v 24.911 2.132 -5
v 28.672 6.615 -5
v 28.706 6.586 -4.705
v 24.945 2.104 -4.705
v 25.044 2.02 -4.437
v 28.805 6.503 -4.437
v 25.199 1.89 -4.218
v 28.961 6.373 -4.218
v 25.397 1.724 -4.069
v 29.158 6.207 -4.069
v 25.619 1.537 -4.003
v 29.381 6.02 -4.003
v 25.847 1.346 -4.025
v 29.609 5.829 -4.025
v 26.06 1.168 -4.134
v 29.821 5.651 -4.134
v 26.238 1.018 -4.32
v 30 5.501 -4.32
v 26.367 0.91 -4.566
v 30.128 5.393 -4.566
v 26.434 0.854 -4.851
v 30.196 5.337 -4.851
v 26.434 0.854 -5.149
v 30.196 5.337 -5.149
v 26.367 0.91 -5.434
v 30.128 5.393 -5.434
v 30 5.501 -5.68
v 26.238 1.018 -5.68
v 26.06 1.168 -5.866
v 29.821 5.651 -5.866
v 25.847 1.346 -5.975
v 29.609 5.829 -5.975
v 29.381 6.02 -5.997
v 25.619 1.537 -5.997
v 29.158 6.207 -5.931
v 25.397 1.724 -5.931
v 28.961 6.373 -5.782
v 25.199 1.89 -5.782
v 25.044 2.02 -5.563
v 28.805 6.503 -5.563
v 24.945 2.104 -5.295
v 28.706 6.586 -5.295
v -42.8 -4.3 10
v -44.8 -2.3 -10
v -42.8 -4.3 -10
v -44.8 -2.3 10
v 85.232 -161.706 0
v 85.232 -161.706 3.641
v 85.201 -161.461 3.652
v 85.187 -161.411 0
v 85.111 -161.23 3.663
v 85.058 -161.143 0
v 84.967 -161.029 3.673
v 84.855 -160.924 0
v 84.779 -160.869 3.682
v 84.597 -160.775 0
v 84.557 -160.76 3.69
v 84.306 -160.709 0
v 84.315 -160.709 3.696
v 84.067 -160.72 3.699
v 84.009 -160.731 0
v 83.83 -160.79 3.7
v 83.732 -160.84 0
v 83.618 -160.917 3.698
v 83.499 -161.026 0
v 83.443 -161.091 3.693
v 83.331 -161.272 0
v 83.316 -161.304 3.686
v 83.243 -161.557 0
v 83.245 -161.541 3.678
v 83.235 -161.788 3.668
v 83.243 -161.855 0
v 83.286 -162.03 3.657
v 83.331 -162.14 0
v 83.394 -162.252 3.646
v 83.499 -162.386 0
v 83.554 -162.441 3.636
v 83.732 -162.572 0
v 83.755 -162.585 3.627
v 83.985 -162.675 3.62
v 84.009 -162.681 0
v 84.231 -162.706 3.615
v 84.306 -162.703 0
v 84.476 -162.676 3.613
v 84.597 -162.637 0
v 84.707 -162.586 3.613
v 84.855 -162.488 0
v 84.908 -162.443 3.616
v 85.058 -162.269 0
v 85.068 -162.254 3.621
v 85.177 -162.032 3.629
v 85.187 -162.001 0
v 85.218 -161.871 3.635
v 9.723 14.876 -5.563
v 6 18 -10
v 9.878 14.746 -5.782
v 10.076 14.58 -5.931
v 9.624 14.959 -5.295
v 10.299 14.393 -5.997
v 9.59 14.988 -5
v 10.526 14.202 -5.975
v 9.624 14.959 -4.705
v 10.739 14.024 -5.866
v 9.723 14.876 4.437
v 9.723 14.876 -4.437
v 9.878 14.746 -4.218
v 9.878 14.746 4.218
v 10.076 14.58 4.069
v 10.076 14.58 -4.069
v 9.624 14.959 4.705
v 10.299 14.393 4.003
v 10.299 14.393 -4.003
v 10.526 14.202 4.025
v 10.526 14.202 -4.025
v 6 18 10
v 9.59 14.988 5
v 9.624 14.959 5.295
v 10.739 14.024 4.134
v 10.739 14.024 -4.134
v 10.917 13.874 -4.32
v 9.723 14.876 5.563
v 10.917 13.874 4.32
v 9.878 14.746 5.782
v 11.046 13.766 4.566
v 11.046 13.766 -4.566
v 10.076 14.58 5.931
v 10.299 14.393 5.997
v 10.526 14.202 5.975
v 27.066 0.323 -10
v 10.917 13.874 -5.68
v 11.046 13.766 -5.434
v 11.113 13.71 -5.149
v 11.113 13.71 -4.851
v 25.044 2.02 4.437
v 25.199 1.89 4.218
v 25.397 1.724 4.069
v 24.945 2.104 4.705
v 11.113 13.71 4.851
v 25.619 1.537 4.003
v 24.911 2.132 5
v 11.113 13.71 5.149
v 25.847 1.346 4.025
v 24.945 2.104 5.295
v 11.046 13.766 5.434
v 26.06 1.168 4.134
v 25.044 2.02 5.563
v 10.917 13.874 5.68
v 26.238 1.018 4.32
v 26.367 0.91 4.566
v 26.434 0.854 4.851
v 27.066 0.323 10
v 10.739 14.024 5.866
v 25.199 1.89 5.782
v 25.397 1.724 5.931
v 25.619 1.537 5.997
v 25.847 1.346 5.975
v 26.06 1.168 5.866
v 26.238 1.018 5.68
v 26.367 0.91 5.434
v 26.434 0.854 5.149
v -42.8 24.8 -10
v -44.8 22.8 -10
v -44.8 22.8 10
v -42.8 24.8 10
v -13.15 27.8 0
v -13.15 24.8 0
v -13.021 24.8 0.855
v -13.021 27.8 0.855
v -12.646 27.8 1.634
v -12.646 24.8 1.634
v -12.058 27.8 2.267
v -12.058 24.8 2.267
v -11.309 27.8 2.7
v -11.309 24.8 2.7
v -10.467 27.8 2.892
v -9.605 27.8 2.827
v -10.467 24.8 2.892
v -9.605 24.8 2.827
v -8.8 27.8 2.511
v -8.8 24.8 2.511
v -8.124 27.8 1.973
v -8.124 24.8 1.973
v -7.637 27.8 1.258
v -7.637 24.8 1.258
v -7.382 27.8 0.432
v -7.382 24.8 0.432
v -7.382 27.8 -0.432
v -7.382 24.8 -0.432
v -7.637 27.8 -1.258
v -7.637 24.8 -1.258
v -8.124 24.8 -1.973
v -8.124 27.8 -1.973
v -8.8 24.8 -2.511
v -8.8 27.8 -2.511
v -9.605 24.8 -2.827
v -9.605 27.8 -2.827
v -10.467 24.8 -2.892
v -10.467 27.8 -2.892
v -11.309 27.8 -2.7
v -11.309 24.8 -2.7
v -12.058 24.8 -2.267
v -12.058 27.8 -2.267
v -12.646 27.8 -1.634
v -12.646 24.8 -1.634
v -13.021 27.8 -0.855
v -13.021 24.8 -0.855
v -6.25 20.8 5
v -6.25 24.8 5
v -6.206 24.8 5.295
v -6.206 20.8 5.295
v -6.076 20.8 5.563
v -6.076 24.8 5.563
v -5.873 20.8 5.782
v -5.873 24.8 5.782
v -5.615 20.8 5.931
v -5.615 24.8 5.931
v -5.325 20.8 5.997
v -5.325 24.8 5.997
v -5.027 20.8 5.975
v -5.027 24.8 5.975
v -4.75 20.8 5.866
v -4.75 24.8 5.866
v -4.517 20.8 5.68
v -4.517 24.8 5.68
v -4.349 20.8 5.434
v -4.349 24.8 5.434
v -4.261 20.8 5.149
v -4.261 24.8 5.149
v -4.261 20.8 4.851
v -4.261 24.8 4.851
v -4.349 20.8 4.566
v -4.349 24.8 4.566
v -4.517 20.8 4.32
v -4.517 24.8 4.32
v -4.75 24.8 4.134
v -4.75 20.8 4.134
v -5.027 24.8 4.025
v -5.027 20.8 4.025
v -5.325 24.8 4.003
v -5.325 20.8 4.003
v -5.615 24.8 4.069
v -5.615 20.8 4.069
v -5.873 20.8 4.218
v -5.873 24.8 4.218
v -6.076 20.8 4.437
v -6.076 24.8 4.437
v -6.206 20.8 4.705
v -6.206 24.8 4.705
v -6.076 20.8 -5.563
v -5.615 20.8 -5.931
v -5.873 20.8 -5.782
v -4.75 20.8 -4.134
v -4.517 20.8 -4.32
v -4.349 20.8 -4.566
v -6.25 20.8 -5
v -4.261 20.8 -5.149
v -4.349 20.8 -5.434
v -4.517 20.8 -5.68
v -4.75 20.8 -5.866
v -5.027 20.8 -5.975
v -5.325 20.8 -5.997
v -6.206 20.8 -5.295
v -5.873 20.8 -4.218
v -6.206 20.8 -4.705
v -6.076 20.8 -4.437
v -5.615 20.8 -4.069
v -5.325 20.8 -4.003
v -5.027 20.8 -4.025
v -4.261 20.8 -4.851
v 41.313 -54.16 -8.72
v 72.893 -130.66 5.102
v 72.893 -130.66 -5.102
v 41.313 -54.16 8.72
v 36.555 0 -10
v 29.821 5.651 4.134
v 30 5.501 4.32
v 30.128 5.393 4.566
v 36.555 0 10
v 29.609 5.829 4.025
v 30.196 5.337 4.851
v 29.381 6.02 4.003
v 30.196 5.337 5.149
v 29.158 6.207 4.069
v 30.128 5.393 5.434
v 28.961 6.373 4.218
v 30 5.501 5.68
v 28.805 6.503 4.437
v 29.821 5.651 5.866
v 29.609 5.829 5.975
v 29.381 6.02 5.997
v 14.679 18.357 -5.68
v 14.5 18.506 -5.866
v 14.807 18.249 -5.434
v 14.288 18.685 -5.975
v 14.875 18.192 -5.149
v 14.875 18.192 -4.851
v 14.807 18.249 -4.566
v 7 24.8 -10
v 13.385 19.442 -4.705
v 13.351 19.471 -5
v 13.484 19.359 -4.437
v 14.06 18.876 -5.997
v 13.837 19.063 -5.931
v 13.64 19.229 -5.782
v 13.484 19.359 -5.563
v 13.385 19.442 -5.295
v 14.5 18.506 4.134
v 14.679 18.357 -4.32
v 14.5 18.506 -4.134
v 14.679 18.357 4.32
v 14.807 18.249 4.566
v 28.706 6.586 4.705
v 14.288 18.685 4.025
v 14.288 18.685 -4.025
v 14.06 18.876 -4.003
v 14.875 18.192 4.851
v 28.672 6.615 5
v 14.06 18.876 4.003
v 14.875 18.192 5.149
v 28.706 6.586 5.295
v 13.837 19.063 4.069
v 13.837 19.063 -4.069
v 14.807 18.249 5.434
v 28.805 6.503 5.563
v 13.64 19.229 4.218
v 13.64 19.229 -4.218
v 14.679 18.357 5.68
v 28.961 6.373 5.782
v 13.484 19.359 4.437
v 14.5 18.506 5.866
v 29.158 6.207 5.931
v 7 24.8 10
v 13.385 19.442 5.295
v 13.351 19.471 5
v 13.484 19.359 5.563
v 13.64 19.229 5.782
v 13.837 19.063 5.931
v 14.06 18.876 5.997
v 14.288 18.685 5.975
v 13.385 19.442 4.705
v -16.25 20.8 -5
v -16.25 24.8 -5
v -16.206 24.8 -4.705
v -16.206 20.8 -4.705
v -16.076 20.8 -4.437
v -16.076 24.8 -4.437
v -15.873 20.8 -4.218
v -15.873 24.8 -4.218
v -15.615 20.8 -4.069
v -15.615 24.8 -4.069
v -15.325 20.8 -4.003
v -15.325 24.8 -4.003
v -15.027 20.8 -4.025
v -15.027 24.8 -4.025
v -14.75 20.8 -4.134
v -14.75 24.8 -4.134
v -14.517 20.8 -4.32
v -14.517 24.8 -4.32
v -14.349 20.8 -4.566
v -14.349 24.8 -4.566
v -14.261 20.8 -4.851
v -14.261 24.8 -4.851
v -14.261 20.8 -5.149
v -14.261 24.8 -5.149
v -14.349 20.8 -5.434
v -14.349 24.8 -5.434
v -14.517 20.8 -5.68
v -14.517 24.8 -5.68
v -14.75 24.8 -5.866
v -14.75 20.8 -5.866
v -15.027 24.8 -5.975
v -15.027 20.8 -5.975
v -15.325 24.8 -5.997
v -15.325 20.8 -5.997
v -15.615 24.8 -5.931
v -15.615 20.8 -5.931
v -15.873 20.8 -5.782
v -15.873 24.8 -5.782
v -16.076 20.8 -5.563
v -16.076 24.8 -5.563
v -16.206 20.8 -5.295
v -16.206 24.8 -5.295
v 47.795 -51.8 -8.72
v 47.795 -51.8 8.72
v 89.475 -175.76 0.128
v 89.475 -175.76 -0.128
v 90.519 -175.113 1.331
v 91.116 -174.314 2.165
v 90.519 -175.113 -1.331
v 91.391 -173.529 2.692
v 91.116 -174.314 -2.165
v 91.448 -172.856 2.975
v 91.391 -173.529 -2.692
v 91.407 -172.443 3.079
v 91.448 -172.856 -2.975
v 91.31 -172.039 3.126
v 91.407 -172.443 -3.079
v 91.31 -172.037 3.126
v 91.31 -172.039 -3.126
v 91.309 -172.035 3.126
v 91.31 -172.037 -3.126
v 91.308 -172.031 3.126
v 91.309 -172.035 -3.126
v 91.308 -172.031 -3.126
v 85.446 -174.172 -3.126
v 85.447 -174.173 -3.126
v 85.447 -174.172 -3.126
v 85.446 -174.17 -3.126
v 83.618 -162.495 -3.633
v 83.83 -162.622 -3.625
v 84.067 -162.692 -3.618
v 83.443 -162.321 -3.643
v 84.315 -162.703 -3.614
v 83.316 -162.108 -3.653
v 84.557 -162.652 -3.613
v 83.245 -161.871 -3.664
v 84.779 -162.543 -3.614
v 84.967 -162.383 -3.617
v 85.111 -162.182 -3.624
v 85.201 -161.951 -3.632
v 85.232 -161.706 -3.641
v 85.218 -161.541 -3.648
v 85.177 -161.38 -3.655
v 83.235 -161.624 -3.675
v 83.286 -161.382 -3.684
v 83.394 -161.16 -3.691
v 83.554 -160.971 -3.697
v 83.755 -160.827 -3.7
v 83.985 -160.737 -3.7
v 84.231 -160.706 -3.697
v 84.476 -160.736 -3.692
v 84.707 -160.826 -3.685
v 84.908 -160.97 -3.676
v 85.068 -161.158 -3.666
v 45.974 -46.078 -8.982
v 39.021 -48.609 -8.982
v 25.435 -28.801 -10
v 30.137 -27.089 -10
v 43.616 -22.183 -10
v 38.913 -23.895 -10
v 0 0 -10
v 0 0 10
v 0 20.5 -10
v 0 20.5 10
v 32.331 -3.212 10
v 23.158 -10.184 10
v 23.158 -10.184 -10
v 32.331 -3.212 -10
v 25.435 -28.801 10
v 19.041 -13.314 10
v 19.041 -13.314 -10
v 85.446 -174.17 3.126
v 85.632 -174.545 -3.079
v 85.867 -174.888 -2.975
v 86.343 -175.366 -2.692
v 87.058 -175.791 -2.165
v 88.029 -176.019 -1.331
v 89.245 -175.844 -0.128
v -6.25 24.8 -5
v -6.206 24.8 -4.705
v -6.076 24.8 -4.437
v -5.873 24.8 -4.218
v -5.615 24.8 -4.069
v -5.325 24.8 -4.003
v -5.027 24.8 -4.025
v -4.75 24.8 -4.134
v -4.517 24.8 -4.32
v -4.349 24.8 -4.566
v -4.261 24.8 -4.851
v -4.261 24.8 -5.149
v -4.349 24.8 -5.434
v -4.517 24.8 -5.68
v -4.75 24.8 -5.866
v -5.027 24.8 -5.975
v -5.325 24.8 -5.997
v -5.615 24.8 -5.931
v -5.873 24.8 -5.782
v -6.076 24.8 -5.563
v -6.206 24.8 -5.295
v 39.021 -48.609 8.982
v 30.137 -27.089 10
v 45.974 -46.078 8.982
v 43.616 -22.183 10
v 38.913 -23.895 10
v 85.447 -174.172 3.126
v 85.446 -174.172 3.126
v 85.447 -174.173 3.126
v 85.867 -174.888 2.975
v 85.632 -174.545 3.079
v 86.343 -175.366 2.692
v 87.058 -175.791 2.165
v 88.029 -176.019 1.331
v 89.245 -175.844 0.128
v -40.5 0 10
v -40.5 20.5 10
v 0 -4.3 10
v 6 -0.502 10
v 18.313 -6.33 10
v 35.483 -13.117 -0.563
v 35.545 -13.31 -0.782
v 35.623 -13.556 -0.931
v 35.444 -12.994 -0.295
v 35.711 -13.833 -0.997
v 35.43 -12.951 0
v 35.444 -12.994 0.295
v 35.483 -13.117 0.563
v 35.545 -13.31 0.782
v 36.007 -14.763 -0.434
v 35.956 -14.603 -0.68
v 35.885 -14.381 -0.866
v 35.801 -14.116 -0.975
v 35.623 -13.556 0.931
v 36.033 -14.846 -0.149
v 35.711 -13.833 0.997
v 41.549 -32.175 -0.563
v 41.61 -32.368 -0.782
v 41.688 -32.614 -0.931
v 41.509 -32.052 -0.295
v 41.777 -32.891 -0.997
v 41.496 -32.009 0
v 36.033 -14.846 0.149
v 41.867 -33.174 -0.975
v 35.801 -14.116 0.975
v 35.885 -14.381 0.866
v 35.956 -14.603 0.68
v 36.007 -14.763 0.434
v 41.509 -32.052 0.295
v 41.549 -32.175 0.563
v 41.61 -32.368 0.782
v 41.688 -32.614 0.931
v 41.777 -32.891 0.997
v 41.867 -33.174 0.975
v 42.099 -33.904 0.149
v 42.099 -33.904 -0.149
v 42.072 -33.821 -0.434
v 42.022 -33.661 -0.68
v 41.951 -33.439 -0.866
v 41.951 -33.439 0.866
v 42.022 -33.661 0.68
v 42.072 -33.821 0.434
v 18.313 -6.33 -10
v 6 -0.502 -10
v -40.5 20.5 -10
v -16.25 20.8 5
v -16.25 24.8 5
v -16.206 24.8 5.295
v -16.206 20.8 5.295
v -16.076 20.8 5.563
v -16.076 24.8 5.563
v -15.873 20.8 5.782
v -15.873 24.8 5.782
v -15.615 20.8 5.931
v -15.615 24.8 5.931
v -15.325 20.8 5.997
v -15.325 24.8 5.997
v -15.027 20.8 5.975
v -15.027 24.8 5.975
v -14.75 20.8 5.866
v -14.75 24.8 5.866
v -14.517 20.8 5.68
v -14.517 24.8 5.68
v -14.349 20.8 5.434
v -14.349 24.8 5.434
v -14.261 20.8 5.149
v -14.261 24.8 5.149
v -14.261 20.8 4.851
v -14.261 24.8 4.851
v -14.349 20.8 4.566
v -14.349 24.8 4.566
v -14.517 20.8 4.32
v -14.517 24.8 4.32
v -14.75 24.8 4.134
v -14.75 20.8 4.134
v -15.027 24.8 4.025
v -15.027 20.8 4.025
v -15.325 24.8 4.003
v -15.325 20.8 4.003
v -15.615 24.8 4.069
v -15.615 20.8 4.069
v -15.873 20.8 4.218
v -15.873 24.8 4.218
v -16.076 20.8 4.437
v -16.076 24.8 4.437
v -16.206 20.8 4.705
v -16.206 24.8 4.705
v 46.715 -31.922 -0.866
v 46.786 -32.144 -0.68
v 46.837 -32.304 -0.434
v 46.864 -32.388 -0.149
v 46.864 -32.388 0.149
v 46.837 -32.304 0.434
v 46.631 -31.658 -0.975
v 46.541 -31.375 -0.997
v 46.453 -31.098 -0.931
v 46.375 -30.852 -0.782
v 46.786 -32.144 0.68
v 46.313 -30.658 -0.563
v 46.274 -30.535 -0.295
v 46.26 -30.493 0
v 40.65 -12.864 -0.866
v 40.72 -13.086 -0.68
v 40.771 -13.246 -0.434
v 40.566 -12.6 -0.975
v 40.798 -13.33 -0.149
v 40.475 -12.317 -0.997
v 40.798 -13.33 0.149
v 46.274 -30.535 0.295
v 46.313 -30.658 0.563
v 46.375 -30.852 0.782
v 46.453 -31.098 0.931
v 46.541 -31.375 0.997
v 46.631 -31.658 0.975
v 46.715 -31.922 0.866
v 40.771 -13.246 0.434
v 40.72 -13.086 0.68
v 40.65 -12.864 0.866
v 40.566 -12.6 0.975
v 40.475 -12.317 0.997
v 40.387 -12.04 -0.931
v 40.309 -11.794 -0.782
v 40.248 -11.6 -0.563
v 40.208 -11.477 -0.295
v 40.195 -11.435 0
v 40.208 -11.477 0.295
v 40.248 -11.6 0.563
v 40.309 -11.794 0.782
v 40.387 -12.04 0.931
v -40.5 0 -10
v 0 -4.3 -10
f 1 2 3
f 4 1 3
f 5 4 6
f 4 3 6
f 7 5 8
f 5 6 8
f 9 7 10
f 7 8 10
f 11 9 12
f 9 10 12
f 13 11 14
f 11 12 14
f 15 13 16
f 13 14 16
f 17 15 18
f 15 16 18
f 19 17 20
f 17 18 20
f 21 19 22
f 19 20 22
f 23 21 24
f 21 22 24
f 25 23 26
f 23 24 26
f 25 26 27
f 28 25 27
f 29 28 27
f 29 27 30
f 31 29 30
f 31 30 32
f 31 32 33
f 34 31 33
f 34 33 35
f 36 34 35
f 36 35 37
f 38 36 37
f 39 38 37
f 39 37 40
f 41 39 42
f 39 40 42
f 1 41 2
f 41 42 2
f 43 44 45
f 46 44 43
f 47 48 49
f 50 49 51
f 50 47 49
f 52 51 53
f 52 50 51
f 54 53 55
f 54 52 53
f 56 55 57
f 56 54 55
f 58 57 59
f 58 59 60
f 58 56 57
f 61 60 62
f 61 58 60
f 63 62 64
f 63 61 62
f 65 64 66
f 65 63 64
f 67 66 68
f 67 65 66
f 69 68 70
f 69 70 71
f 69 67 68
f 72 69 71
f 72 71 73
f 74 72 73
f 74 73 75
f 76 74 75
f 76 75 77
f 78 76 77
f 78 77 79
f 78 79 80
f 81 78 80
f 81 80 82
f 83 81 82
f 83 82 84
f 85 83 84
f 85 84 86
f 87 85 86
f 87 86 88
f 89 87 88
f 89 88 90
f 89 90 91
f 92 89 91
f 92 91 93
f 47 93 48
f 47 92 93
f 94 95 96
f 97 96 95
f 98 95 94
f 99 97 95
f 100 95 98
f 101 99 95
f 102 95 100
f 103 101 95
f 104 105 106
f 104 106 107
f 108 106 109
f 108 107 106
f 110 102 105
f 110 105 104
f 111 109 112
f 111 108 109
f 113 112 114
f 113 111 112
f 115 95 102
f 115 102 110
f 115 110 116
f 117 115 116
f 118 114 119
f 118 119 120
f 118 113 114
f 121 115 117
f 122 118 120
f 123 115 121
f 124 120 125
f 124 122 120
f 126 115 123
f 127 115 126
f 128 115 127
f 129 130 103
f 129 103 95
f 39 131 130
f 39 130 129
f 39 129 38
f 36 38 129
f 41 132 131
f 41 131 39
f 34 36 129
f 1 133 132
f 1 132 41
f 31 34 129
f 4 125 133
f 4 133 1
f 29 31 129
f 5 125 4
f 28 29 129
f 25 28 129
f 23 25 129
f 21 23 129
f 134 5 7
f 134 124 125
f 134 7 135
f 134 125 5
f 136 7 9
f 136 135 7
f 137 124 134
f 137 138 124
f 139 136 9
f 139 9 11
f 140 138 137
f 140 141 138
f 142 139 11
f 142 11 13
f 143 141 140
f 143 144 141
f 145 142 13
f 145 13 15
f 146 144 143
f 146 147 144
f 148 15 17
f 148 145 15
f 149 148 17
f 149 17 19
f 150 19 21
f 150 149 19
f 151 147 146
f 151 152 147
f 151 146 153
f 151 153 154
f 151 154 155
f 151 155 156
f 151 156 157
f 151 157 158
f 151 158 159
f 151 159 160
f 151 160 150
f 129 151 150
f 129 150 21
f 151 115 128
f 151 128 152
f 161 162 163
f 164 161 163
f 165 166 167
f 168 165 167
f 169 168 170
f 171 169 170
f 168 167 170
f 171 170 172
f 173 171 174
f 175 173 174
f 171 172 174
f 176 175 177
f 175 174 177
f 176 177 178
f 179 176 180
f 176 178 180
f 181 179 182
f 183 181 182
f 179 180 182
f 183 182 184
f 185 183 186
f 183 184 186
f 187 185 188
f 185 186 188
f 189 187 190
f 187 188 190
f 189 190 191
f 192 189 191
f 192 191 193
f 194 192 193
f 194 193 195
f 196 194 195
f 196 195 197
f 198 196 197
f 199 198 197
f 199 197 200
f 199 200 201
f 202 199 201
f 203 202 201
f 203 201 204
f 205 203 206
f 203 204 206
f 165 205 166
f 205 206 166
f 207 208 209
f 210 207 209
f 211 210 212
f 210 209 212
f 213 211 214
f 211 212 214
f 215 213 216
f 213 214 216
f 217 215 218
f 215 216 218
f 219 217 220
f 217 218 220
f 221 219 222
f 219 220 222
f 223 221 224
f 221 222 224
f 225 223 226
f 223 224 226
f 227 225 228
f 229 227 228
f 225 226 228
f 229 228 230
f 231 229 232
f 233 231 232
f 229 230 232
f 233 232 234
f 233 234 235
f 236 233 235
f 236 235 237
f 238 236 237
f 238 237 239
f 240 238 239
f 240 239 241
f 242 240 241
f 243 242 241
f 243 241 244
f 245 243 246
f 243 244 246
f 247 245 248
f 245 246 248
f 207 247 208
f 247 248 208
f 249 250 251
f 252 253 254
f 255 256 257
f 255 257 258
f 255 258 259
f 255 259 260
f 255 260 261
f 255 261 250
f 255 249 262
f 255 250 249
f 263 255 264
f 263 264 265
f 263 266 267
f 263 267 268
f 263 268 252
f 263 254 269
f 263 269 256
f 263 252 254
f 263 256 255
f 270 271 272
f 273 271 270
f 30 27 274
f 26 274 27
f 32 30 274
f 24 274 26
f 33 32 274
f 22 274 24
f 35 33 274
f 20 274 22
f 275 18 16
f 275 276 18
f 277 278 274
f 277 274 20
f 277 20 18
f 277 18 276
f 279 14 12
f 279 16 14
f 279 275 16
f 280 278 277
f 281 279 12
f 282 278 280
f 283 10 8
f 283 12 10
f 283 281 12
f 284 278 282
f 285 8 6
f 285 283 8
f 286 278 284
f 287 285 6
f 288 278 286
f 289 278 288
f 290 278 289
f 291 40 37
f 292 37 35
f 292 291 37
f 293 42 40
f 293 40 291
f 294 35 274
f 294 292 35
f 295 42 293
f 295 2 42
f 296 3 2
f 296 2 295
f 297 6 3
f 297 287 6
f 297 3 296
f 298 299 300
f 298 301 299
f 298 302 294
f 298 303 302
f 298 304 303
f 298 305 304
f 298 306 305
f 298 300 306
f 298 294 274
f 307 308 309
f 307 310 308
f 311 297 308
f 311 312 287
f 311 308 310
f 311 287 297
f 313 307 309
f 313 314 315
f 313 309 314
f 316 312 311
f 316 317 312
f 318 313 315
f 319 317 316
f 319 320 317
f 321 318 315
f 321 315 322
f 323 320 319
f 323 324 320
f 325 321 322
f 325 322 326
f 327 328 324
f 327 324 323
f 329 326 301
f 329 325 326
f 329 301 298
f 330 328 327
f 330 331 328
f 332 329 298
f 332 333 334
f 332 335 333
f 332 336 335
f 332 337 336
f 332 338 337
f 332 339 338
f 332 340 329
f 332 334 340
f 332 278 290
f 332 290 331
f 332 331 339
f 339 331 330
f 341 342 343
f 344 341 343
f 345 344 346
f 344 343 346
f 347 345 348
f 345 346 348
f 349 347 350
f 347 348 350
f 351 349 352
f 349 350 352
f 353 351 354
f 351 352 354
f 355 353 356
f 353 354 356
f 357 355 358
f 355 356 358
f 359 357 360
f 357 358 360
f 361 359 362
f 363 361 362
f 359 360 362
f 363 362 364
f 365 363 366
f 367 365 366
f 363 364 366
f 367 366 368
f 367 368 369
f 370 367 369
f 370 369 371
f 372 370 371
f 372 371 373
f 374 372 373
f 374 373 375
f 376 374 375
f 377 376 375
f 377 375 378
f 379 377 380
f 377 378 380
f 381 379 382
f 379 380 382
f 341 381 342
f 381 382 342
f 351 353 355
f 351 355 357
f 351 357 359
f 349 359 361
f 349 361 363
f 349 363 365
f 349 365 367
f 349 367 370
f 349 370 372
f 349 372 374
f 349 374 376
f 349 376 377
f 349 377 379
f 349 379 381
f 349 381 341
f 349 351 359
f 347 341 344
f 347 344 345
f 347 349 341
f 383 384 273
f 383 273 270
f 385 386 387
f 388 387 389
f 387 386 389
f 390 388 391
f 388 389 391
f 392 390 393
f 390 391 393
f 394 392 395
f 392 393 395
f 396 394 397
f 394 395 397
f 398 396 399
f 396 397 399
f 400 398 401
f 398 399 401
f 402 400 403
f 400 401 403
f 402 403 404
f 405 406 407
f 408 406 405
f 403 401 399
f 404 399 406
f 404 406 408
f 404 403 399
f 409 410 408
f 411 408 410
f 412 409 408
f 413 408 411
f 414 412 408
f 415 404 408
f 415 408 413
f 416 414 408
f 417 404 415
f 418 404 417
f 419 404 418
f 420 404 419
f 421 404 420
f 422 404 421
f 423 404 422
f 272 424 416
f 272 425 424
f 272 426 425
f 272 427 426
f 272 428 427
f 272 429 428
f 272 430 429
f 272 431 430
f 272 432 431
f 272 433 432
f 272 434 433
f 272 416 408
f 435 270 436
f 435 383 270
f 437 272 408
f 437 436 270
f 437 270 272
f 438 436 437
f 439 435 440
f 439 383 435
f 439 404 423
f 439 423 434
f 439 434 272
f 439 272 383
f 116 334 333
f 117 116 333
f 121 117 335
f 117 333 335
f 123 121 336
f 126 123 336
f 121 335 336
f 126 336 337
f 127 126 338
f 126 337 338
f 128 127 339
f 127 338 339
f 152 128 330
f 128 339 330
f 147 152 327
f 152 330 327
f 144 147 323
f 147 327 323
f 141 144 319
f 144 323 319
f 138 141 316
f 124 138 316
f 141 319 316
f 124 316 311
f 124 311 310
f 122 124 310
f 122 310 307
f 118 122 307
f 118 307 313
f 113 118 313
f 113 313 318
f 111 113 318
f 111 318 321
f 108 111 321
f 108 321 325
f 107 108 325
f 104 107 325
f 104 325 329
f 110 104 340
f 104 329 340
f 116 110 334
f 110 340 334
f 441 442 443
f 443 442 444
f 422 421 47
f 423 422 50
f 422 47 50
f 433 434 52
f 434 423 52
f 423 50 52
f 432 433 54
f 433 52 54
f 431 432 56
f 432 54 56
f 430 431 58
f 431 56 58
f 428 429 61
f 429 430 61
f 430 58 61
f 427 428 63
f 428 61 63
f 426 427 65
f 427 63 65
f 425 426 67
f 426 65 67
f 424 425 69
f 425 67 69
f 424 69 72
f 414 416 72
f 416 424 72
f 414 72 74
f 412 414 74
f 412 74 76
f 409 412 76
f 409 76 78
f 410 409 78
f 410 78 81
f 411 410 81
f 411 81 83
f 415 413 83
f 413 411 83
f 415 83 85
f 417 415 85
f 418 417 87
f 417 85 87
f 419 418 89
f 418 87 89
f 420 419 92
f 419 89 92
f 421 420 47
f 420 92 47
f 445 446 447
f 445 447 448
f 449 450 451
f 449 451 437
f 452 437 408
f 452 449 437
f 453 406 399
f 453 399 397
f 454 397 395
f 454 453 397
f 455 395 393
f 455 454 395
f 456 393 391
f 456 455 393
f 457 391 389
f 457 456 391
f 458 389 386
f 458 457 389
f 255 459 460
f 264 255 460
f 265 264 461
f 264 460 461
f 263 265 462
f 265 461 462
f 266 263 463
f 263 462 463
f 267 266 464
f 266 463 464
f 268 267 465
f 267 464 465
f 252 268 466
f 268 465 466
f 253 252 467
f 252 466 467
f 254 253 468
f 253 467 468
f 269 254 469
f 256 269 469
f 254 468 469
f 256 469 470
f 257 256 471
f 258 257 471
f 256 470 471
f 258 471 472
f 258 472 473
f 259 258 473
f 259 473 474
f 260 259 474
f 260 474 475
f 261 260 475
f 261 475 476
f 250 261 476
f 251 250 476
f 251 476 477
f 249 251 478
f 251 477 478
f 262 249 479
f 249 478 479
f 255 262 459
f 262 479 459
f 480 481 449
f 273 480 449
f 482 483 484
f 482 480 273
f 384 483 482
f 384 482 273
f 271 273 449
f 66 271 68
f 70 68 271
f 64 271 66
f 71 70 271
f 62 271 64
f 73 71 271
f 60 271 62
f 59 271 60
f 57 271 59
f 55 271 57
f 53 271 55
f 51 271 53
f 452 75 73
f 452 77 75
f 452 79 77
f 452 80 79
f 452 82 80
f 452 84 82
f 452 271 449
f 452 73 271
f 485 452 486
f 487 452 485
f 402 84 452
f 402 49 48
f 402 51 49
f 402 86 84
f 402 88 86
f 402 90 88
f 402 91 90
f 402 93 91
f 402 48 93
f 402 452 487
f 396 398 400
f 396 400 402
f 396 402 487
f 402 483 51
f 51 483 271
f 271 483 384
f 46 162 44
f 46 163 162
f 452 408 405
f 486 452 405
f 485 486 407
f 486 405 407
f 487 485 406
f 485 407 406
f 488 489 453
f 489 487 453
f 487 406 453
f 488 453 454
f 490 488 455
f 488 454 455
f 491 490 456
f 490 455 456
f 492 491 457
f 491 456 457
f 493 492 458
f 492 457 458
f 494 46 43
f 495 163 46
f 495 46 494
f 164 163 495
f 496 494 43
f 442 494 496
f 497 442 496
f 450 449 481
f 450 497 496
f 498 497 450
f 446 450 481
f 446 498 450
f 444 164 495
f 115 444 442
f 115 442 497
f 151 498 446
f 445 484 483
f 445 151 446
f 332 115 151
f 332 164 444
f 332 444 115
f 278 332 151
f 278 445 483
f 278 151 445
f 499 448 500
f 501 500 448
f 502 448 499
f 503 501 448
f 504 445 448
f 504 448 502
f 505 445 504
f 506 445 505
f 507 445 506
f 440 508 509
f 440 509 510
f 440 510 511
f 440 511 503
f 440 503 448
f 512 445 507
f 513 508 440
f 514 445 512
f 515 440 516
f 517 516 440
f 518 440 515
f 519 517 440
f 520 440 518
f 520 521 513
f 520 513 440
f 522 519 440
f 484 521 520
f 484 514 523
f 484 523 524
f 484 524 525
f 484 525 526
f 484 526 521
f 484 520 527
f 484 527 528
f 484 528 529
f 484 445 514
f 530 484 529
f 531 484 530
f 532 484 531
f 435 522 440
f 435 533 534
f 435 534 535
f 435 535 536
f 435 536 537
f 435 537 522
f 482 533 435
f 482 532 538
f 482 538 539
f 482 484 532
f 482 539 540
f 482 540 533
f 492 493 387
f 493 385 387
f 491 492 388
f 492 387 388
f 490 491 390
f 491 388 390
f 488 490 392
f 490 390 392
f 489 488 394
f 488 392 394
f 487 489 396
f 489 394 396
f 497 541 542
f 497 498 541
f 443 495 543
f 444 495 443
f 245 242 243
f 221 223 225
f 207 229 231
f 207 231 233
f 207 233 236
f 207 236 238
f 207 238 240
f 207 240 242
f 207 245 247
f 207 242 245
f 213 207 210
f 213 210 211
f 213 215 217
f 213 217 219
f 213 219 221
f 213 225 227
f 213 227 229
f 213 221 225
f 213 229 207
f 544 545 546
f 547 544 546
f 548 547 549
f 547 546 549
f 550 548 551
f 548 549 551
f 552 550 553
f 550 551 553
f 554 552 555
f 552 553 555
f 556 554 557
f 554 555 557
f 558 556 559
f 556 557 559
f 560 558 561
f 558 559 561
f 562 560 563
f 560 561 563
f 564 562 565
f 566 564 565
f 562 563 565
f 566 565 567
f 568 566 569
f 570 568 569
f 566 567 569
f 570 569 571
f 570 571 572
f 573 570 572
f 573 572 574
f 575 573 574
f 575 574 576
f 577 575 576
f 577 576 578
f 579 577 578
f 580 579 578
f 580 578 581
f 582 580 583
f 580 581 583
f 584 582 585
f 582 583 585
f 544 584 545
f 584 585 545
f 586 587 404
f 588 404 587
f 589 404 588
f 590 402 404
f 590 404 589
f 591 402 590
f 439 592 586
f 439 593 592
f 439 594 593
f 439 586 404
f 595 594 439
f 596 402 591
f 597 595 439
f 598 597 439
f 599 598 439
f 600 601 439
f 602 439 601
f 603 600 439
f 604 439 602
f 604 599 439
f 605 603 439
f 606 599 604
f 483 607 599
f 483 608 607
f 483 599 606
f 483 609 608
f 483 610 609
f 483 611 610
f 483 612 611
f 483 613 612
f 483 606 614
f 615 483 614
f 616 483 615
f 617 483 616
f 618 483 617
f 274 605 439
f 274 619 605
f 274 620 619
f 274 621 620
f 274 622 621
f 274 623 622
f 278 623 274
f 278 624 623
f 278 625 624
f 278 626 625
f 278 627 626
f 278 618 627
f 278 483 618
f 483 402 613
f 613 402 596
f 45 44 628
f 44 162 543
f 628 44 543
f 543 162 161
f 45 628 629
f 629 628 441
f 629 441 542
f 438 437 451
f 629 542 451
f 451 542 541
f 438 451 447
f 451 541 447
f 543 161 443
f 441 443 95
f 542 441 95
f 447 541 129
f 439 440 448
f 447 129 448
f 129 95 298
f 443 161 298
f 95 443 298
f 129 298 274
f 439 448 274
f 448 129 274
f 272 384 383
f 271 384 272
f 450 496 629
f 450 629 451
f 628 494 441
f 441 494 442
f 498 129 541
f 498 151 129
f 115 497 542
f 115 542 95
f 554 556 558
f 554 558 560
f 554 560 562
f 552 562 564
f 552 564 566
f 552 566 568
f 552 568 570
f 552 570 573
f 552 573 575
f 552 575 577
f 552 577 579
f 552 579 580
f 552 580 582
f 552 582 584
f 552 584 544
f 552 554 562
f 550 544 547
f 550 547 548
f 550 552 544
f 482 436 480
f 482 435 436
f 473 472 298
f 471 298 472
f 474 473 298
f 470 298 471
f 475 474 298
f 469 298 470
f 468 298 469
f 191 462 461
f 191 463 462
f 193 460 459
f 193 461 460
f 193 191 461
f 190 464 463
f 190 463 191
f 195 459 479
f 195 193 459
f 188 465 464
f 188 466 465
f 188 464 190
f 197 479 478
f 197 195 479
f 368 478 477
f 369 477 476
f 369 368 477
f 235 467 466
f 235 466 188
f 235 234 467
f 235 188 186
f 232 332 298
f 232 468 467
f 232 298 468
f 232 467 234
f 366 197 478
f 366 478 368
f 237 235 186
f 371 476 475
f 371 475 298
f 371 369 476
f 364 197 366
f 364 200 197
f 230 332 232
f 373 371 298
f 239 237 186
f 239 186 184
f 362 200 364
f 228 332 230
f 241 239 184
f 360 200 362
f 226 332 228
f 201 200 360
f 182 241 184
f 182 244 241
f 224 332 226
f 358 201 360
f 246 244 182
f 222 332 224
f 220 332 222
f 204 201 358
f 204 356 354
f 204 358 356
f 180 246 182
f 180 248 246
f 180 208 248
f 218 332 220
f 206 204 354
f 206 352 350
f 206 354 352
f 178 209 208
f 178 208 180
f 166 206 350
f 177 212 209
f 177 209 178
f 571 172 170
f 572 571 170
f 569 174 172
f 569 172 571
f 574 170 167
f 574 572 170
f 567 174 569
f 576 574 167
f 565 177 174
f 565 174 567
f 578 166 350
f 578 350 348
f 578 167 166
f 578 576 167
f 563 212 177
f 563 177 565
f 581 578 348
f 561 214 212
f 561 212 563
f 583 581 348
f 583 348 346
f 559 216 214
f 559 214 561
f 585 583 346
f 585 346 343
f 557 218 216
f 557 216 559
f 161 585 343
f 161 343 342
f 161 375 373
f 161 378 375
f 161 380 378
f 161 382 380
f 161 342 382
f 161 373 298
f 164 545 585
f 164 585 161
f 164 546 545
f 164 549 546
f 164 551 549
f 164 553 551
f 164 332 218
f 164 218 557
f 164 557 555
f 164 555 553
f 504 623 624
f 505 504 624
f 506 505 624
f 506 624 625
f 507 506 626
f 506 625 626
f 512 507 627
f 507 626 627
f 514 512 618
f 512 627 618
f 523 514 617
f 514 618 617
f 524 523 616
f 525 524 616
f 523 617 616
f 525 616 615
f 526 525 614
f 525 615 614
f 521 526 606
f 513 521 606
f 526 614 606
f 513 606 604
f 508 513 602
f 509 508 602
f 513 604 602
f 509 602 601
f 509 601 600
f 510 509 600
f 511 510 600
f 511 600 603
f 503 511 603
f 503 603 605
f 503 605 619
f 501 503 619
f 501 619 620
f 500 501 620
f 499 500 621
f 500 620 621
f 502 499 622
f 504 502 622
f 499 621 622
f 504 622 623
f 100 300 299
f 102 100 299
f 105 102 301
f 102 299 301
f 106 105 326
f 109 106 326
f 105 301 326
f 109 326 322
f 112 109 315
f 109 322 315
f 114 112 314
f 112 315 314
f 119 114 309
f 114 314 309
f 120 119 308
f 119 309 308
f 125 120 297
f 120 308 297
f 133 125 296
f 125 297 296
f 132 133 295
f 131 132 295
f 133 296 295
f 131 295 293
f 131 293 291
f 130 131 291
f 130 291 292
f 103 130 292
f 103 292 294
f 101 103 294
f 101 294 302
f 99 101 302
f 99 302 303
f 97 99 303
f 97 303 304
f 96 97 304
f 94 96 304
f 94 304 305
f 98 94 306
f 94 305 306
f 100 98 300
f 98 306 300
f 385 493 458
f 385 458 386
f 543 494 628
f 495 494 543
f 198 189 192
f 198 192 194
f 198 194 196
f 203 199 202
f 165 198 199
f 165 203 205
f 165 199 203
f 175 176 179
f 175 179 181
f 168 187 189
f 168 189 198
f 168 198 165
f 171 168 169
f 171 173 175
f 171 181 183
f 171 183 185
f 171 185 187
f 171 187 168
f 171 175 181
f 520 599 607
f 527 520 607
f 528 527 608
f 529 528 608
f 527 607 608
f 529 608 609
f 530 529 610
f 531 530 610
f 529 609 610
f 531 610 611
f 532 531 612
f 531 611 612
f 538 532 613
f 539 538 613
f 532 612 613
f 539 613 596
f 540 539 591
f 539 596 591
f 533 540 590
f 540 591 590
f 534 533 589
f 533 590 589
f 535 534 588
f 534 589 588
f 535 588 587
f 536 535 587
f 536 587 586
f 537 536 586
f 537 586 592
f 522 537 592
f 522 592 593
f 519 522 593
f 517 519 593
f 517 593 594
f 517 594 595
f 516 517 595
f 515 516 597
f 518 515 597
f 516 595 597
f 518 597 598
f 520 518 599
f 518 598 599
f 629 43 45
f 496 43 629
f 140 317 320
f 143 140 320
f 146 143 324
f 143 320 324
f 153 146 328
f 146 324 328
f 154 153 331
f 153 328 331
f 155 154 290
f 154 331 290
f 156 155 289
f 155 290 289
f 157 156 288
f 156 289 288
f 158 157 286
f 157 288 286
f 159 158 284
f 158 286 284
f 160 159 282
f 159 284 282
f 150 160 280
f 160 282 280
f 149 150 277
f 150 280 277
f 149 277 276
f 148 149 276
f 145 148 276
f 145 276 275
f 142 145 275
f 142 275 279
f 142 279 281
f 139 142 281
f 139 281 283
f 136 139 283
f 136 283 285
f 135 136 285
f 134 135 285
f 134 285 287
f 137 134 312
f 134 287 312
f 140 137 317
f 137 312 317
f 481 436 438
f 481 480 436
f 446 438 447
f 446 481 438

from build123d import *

# Parameters (mm, degrees)
F0_W           = 40.5
F0_H           = 20.5
F1_DEPTH       = 10
F2_SIZE        = 2
F3_R           = 2.9
F4_DEPTH       = 3
F7_DEPTH       = 126.422950013
F7_DEPTH_BACK  = 72.2858581577
F8_R           = 3
F9_R           = 1
F10_DEPTH      = 4
F12_DEPTH      = 3.596245468
F12_DEPTH_BACK = 3.8025450309
F13_R          = 1
F14_DEPTH      = 5.851831237
F15_R          = 1
F16_DEPTH      = 5
F17_R          = 1
F18_DEPTH      = 10.001
F18_DEPTH_BACK = 10.001


with BuildPart() as f1:
    # F0 (on Top) → F1 (new body, symmetric)
    with BuildSketch(Plane.XY):
        Polygon((7, 24.8), (-44.8, 24.8), (-44.8, -4.3), (0, -4.3), (19.0412067101, -13.3135236694), (86.5428958395, -176.8274940062), (92.1810515642, -174.7753731462), (36.5554890963, 0), align=None)
        with Locations((-20.25, 10.25)):
            Rectangle(F0_W, F0_H, mode=Mode.SUBTRACT)
        Polygon((6, -0.5019311232), (6, 18.0000764784), (27.0662221858, 0.3234172121), (18.3128683715, -6.3304656376), align=None, mode=Mode.SUBTRACT)
        Polygon((23.1584805053, -10.1837681409), (32.3305180335, -3.2116218642), (72.8933752329, -130.660014085), align=None, mode=Mode.SUBTRACT)
    extrude(amount=F1_DEPTH, both=True)

    # F2
    f2_edges = [f1.edges().sort_by_distance(p)[0] for p in [
        (-44.8, 24.8, 0),
        (-44.8, -4.3, 0),
    ]]
    chamfer(f2_edges, length=F2_SIZE)

    # F3 (on face) → F4 (join)
    with BuildSketch(Plane(origin=(0, 24.8, 0), x_dir=(-1, 0, 0), z_dir=(0, 1, 0))):
        with Locations((10.25, 0)):
            Circle(F3_R)
    extrude(amount=F4_DEPTH)

    # F6 (on mid) → F7 (cut, two sides)
    with BuildSketch(Plane(origin=(22.4071169072, 8.1555235899, 0), x_dir=(-0.3420201433, 0.9396926208, 0), z_dir=(0.9396926208, 0.3420201433, 0))) as f7_sk:
        Polygon((-35.7629049085, -10), (-195.7629049085, -3), (-195.7629049085, -10), align=None)
        Polygon((-35.7629049085, 10), (-195.7629049085, 10), (-195.7629049085, 3), align=None)
    extrude(amount=-F7_DEPTH, mode=Mode.SUBTRACT)
    extrude(f7_sk.sketch, amount=F7_DEPTH_BACK, mode=Mode.SUBTRACT)

    # F8
    f8_edges = [f1.edges().sort_by_distance(p)[0] for p in [
        (92.181052, -174.775373, 0),
        (89.361974, -175.801434, 3),
        (86.542896, -176.827494, 0),
        (89.361974, -175.801434, -3),
    ]]
    fillet(f8_edges, radius=F8_R)

    # F9 (on face) → F10 (cut)
    with BuildSketch(Plane(origin=(0, 24.8, 0), x_dir=(-1, 0, 0), z_dir=(0, 1, 0))):
        with Locations((15.25, 5)):
            Circle(F9_R)
        with Locations((15.25, -5)):
            Circle(F9_R)
        with Locations((5.25, -5)):
            Circle(F9_R)
        with Locations((5.25, 5)):
            Circle(F9_R)
    extrude(amount=-F10_DEPTH, mode=Mode.SUBTRACT)

    # F11 (on mid) → F12 (join, two sides)
    with BuildSketch(Plane(origin=(22.4071169072, 8.1555235899, 0), x_dir=(-0.3420201433, 0.9396926208, 0), z_dir=(0.9396926208, 0.3420201433, 0))) as f12_sk:
        Polygon((-59.0230961969, -8.9823666311), (-59.0230961969, 8.9823666311), (-65.0230961969, 8.7198666311), (-65.0230961969, -8.7198666311), align=None)
    extrude(amount=F12_DEPTH)
    extrude(f12_sk.sketch, amount=-F12_DEPTH_BACK)

    # F13 (on face) → F14 (cut, through all)
    with BuildSketch(Plane(origin=(15.1038475155, 18.0000645386, 0), x_dir=(-0.7660444431, 0.6427876097, 0), z_dir=(0.6427876097, 0.7660444431, 0))):
        with Locations((1.2878461653, 5)):
            Circle(F13_R)
        with Locations((1.2878461653, -5)):
            Circle(F13_R)
        with Locations((-18.7121538347, -5)):
            Circle(F13_R)
        with Locations((-18.7121538347, 5)):
            Circle(F13_R)
    extrude(amount=-F14_DEPTH, mode=Mode.SUBTRACT)

    # F15 (on face) → F16 (cut, through all)
    with BuildSketch(Plane(origin=(33.19318295, 10.5643572001, 0), x_dir=(-0.3032789919, 0.9529018066, 0), z_dir=(0.9529018066, 0.3032789919, 0))):
        with Locations((-24.0865118803, 0)):
            Circle(F15_R)
        with Locations((-44.0865118803, 0)):
            Circle(F15_R)
    extrude(amount=-F16_DEPTH, mode=Mode.SUBTRACT)

    # F17 (on Top) → F18 (cut, two sides)
    with BuildSketch(Plane.XY) as f18_sk:
        with Locations((84.231671552, -161.7060442644)):
            Circle(F17_R)
    extrude(amount=-F18_DEPTH, mode=Mode.SUBTRACT)
    extrude(f18_sk.sketch, amount=F18_DEPTH_BACK, mode=Mode.SUBTRACT)


solid = f1.part
